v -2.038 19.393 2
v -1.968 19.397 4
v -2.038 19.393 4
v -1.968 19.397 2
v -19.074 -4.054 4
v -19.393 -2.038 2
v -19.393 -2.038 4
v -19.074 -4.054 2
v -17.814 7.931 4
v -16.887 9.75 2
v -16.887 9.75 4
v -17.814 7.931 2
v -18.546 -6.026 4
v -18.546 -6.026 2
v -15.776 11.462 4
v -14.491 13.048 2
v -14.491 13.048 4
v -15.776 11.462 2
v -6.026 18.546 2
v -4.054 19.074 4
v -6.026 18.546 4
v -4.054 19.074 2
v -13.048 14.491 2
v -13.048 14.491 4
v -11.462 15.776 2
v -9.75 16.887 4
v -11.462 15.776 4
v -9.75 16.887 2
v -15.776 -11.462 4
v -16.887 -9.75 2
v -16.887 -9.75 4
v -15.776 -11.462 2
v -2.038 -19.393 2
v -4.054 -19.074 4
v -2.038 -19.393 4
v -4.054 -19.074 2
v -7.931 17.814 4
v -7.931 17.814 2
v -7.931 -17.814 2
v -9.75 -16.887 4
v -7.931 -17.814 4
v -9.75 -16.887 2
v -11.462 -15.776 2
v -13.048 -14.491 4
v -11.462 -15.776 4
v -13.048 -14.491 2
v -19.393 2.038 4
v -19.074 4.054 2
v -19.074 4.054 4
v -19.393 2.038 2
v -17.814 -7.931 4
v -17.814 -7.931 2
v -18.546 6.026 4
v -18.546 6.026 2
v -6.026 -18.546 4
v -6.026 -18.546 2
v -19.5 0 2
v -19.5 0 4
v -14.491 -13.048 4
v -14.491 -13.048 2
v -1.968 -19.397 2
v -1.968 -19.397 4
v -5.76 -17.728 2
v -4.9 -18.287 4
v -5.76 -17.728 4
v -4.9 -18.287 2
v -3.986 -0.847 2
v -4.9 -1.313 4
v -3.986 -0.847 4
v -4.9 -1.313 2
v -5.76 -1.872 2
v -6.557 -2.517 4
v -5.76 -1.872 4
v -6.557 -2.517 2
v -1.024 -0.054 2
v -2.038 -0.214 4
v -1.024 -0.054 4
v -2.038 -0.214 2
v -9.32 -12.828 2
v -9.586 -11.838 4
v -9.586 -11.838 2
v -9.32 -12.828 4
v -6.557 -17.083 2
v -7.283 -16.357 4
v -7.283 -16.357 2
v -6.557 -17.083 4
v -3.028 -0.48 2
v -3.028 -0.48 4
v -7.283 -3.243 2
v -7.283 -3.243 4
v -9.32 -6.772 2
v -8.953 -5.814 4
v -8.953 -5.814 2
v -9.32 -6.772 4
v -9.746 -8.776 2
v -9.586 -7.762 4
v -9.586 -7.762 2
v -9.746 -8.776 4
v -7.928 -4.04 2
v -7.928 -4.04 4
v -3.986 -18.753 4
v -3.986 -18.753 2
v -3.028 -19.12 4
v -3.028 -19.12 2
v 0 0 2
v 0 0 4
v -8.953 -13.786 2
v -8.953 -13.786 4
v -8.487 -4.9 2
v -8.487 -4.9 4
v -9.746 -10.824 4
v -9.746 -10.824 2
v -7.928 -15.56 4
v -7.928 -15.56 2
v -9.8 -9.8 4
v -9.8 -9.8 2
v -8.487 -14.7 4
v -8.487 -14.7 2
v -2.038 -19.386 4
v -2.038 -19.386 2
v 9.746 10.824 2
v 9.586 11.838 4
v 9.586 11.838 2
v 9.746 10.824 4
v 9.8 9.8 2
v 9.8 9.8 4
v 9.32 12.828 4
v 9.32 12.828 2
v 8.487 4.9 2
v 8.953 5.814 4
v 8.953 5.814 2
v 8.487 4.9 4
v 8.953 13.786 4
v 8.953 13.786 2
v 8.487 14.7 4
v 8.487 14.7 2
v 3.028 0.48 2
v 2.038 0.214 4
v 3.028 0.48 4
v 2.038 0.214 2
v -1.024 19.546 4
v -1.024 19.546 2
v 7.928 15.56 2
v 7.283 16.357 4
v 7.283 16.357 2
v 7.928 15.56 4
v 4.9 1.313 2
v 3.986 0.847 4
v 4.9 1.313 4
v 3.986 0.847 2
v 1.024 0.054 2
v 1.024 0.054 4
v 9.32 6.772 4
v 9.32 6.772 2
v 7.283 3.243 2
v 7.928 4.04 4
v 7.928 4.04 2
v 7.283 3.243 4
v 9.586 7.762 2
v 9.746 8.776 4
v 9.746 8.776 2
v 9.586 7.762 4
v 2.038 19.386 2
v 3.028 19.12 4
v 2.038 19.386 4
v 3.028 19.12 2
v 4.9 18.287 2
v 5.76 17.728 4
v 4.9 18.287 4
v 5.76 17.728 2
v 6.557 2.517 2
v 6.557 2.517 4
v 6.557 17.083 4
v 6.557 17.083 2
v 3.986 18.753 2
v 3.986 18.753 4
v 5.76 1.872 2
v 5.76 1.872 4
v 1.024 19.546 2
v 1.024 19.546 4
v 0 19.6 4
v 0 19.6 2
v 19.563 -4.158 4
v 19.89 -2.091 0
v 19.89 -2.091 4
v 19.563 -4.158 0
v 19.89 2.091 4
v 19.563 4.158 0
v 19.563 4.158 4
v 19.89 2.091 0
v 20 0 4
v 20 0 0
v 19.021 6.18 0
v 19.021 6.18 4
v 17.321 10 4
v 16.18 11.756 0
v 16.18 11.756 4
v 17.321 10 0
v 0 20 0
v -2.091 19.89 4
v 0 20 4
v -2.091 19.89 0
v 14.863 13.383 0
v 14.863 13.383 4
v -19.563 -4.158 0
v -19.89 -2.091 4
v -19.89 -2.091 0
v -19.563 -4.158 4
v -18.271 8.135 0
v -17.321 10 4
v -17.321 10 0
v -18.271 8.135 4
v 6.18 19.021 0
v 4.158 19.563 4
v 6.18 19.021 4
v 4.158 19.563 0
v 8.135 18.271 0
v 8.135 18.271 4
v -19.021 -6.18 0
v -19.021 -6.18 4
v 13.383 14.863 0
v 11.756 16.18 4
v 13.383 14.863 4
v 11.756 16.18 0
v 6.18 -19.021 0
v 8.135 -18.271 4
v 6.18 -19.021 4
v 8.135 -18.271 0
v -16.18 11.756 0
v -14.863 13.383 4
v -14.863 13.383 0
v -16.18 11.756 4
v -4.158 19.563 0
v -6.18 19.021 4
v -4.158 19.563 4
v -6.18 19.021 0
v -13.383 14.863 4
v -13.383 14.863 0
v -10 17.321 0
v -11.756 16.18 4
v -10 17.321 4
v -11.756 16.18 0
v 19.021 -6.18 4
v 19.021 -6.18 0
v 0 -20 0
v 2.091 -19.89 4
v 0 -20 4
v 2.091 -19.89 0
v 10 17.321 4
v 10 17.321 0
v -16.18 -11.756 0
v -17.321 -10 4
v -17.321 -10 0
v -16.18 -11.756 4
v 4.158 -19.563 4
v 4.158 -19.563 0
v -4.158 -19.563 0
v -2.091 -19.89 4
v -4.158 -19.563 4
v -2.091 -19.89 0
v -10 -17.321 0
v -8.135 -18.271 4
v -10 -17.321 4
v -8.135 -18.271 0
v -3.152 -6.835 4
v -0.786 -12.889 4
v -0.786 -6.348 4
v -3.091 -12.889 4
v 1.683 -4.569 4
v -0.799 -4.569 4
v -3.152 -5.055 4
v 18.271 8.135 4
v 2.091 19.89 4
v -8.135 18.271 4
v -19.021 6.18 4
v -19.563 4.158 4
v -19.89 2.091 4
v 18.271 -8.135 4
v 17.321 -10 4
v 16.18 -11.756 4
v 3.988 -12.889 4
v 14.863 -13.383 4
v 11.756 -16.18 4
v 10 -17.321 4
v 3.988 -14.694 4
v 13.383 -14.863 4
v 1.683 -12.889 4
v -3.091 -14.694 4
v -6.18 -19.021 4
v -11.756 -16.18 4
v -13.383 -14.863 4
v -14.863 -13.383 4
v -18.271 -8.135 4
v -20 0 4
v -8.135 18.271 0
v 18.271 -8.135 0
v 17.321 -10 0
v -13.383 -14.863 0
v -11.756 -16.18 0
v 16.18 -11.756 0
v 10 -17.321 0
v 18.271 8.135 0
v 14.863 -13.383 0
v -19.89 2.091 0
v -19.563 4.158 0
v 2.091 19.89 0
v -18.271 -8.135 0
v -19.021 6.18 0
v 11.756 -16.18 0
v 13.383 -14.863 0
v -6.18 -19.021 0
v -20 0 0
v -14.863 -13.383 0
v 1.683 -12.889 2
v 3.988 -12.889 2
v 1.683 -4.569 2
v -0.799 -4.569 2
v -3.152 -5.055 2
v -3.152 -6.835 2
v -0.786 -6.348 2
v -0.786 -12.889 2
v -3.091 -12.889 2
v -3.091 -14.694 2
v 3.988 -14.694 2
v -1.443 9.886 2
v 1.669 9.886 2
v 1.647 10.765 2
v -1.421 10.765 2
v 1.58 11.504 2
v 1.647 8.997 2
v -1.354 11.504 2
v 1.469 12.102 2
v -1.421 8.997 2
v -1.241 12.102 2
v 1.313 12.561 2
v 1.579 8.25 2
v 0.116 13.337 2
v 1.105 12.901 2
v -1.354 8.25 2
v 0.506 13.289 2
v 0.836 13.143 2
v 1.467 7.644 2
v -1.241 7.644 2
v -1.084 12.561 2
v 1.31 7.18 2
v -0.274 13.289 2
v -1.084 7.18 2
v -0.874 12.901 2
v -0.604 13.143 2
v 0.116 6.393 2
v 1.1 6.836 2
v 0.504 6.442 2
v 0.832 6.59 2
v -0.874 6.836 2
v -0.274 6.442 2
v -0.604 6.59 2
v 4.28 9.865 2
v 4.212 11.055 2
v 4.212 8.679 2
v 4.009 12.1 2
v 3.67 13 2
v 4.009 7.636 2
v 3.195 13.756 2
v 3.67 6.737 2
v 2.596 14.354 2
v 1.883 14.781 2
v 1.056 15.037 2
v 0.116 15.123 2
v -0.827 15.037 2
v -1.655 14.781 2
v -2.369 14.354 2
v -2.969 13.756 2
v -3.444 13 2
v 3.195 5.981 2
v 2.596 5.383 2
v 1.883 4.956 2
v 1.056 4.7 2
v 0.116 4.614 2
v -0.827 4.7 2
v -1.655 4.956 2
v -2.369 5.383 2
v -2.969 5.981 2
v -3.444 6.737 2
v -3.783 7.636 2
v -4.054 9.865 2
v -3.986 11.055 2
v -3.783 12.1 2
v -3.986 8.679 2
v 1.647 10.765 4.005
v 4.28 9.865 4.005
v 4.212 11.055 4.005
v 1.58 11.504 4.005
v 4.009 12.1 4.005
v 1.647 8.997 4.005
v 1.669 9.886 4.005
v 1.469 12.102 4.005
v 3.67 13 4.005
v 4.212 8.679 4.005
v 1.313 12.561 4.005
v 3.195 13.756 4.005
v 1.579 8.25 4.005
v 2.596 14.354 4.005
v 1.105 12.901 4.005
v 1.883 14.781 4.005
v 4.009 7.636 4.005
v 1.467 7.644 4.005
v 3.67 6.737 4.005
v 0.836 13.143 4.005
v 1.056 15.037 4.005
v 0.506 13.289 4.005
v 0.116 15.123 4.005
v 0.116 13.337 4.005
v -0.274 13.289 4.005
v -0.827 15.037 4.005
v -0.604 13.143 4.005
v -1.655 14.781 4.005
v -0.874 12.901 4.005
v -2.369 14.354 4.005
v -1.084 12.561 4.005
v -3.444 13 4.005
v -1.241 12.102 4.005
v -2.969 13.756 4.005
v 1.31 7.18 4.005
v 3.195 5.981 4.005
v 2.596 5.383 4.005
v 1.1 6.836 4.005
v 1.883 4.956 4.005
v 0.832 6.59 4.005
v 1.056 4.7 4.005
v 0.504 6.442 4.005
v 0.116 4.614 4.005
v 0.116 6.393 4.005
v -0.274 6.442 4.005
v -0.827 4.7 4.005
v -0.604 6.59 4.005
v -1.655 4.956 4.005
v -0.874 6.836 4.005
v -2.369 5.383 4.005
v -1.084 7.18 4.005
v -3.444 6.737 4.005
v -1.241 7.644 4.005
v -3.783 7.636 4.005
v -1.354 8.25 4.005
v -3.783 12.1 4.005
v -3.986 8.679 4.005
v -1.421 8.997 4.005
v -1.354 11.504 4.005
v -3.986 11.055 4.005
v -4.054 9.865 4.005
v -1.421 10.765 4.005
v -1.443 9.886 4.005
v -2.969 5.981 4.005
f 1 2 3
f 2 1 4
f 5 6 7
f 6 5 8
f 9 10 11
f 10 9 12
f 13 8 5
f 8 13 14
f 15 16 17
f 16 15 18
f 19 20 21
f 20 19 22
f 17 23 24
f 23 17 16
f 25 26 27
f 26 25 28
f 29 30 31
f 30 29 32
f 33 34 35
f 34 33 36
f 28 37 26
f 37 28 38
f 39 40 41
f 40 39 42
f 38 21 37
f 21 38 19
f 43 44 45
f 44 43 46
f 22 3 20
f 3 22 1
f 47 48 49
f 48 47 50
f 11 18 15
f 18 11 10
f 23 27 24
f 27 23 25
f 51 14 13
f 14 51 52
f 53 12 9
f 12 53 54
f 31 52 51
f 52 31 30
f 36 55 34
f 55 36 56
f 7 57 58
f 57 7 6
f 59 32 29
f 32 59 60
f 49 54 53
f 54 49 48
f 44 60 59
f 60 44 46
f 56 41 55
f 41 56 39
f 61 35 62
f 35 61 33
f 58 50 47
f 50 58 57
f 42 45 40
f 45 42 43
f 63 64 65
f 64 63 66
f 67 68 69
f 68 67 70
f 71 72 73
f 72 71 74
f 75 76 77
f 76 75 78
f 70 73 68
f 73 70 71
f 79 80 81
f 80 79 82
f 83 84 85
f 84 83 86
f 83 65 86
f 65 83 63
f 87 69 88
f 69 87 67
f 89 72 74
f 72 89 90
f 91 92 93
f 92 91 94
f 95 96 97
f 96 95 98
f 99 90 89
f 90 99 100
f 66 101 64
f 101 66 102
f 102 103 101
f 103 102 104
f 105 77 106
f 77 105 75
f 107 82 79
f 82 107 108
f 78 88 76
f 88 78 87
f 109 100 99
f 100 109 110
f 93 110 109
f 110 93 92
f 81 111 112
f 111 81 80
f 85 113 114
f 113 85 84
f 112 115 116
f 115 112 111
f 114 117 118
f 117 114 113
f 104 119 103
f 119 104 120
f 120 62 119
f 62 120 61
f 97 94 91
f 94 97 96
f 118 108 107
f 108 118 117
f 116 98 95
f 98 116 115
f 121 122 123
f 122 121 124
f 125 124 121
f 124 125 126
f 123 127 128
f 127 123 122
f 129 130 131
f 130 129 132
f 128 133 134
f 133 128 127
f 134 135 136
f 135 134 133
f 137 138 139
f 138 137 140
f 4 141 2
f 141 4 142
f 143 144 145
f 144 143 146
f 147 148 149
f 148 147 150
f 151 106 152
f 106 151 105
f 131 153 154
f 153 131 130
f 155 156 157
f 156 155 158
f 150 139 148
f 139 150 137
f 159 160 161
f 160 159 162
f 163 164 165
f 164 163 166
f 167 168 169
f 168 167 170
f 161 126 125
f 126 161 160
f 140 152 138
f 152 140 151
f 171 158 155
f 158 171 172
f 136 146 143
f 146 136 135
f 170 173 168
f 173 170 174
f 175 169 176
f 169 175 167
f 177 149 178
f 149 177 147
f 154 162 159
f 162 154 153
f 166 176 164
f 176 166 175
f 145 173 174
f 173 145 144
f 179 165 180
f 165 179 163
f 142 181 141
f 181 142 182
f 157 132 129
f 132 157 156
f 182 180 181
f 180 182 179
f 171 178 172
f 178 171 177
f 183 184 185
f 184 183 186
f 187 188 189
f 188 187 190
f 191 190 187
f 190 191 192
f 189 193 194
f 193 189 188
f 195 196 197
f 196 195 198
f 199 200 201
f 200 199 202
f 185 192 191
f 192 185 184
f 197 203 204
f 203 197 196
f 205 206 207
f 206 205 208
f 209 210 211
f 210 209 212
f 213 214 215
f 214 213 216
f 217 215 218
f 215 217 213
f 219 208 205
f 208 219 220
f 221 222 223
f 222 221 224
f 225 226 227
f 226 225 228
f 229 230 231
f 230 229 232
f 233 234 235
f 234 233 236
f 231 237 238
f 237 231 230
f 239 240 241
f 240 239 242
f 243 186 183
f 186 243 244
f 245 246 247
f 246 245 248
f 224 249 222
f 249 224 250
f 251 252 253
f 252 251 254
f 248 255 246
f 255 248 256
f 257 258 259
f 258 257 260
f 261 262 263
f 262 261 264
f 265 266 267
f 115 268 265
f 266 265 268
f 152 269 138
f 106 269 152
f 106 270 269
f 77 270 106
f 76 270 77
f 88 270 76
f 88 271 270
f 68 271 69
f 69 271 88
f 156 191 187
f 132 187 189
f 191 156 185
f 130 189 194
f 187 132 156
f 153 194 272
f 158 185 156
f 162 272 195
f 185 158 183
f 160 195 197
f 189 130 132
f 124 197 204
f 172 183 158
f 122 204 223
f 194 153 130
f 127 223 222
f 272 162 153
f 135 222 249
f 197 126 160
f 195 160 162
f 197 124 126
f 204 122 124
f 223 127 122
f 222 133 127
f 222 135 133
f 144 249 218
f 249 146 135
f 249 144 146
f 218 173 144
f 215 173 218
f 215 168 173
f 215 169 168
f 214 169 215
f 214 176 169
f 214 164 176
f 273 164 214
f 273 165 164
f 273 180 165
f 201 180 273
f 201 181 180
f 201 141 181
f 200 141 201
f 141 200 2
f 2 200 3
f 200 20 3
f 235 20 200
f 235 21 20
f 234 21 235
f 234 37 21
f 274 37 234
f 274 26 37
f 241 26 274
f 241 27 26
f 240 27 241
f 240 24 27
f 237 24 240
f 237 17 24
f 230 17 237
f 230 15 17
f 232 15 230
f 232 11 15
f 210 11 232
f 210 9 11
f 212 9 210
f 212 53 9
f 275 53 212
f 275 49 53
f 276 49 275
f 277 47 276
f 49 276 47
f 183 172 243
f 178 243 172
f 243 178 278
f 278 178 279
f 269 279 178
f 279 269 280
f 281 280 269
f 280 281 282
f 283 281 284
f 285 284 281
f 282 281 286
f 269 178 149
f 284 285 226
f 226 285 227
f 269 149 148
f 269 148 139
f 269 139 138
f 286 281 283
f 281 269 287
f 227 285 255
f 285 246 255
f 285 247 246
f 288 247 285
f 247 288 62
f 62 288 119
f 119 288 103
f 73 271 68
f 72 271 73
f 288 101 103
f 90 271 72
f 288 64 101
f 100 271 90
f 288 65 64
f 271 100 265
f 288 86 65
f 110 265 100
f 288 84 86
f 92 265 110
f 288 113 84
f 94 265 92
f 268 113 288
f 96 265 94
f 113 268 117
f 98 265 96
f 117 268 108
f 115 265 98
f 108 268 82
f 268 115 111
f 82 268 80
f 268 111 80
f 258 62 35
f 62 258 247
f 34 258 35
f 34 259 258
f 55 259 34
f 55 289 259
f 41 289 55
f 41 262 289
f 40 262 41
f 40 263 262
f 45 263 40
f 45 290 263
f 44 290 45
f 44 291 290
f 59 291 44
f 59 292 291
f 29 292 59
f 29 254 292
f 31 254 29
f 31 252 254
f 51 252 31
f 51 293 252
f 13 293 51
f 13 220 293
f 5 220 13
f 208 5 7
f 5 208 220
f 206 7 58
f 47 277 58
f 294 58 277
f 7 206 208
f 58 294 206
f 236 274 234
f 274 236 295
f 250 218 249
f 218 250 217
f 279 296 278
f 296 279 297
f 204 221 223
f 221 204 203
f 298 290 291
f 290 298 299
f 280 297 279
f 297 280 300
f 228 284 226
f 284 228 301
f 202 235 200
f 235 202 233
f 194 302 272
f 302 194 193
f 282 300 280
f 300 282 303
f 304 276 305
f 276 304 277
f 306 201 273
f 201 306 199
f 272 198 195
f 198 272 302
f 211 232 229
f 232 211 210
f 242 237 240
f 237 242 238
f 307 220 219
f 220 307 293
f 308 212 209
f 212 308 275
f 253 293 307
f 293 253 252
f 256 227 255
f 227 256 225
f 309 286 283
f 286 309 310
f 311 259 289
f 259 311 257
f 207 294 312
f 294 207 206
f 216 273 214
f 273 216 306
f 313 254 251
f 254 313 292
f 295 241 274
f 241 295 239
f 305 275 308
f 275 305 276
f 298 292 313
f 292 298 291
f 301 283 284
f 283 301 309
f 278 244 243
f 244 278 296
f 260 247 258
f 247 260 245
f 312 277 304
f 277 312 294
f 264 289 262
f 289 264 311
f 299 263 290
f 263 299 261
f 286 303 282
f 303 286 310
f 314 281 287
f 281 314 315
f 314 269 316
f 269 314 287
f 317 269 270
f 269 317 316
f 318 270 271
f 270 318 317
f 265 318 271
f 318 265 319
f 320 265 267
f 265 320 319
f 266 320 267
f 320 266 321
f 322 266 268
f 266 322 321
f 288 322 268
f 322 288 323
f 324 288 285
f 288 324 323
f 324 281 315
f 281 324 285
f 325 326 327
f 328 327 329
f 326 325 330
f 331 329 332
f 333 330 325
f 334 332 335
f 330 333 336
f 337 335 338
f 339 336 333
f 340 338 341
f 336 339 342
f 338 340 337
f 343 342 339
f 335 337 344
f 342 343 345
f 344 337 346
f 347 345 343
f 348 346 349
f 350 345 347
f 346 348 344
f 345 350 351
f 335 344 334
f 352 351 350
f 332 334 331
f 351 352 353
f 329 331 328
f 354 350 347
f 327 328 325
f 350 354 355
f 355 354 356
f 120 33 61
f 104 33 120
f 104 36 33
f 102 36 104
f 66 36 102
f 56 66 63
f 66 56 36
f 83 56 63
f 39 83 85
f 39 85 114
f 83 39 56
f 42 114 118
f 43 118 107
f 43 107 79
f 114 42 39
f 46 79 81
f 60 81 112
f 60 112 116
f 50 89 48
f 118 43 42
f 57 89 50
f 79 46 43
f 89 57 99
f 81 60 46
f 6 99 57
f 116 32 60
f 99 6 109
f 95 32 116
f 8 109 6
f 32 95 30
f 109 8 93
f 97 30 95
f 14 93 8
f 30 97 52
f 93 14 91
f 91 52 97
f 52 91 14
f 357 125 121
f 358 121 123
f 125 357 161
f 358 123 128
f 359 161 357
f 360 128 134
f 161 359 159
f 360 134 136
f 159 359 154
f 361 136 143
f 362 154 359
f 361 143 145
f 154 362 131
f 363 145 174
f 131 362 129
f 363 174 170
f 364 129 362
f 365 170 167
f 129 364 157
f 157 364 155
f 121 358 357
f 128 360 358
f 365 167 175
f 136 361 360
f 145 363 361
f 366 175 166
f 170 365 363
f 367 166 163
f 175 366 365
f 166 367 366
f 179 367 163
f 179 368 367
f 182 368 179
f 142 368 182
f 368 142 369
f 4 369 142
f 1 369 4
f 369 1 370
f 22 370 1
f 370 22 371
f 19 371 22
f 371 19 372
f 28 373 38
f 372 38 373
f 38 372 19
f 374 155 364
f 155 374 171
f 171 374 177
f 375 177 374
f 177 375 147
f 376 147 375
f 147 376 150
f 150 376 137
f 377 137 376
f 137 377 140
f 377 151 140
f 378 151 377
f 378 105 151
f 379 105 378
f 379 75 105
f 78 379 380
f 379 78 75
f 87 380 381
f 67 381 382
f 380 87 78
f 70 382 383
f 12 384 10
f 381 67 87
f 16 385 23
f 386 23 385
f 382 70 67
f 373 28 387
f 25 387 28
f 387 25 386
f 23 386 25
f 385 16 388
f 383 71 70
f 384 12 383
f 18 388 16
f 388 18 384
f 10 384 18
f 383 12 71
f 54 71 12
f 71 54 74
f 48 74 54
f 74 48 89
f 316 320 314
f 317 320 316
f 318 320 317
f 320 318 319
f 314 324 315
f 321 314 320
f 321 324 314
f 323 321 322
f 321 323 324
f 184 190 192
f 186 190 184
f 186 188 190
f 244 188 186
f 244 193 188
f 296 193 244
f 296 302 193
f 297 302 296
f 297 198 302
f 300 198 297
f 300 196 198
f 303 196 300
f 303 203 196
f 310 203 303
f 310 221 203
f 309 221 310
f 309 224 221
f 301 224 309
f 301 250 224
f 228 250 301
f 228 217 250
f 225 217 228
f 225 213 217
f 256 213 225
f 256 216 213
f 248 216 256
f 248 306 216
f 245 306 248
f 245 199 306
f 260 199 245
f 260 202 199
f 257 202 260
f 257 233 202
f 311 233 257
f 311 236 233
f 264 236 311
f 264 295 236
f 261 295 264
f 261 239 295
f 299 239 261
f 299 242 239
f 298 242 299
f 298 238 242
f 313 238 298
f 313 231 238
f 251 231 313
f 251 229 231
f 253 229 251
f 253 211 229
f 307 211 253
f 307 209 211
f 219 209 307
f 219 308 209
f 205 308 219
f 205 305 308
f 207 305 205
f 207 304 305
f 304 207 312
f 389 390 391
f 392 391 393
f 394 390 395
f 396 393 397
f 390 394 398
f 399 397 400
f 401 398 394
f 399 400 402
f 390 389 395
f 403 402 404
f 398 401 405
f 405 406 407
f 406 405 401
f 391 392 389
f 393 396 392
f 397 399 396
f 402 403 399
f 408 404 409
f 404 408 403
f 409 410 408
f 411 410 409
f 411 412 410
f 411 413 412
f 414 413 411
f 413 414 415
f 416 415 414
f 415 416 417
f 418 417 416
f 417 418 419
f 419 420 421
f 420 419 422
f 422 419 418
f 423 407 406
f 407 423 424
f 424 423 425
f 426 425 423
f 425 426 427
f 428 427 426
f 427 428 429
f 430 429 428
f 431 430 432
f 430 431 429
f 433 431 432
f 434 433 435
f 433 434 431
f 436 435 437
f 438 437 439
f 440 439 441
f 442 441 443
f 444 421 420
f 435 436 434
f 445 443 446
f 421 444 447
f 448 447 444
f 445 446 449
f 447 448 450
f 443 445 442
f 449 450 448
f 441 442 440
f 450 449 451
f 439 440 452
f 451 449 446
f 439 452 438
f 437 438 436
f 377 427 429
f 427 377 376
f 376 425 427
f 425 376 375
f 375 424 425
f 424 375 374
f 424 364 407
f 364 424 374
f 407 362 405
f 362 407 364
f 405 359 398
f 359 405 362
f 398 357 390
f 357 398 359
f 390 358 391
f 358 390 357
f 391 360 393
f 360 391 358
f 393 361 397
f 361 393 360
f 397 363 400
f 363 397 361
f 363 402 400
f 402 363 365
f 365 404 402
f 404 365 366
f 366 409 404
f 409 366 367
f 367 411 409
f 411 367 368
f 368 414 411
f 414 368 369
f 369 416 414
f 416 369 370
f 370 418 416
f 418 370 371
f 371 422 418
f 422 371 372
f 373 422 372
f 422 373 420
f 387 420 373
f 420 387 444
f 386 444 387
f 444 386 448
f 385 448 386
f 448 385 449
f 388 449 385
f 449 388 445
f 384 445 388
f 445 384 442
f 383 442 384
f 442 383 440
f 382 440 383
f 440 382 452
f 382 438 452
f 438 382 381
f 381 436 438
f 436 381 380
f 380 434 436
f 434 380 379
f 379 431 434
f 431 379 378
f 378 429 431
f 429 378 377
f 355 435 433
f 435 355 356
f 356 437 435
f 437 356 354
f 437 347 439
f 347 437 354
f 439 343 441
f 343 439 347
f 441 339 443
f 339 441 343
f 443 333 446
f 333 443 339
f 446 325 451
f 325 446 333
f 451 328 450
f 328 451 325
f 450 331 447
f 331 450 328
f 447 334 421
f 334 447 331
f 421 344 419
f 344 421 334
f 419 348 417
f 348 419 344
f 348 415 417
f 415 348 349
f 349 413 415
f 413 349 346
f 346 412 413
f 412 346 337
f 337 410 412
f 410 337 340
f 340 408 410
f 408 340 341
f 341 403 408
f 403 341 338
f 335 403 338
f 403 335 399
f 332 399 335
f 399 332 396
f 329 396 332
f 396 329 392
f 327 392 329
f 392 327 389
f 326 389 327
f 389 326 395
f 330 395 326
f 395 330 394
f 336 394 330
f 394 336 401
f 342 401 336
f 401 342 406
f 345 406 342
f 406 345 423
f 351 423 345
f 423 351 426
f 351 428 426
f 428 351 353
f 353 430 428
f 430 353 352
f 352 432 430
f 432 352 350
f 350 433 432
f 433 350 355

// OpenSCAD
// coderdojo coin
// created by weevilgenius

// preview[view:south, tilt:top]

// overall diameter of coin in mm
width = 40; // [20:100]
// total height of coin in mm
height = 4; // [2:10]
// width of border line around white portion
border = 1; //[0,1,2,3,4,5]
// font for numbers
font = "Roboto Mono:style=Bold";


shim = 1/10; // makes the cutout circles look tangent to the border
tolerance = 5/1000; // avoid coincident faces

union() {
  // lower body
  color("white") cylinder(d=width, h=height/2, $fn=60);
  // top swirl
  color("dimgray") translate([0, 0, height/2-tolerance])
  difference() {
    cylinder(d=width, h=height/2+tolerance, $fn=60);
    union() {
      // upper lobe
      translate([0, width/4-border/4+shim/2, 0])
        cylinder(d=width/2-border/2+shim, h=height+2, center=true, $fn=60);
      difference() {
        // smaller to create the border
        cylinder(d=width-border, h=height+2, center=true, $fn=60);
        translate([0, -width, -height/2-2])
          cube([width*2, width*2, height+4]);
        // lower lobe
        translate([0, -width/4+border/4-shim/2, 0])
          cylinder(d=width/2-border/2+shim, h=height+4, center=true, $fn=60);
      }
    }
    // number 1
    translate([0, -width/4+border/4, 0]) linear_extrude(height)
      text("1", font=font, valign="center", halign="center", size=width/4);
  }
  // number 0
  color("dimgray") translate([0, width/4-border/4, height/2])
    linear_extrude(height/2+tolerance)
      text("0", font=font, valign="center", halign="center", size=width/4);
}
